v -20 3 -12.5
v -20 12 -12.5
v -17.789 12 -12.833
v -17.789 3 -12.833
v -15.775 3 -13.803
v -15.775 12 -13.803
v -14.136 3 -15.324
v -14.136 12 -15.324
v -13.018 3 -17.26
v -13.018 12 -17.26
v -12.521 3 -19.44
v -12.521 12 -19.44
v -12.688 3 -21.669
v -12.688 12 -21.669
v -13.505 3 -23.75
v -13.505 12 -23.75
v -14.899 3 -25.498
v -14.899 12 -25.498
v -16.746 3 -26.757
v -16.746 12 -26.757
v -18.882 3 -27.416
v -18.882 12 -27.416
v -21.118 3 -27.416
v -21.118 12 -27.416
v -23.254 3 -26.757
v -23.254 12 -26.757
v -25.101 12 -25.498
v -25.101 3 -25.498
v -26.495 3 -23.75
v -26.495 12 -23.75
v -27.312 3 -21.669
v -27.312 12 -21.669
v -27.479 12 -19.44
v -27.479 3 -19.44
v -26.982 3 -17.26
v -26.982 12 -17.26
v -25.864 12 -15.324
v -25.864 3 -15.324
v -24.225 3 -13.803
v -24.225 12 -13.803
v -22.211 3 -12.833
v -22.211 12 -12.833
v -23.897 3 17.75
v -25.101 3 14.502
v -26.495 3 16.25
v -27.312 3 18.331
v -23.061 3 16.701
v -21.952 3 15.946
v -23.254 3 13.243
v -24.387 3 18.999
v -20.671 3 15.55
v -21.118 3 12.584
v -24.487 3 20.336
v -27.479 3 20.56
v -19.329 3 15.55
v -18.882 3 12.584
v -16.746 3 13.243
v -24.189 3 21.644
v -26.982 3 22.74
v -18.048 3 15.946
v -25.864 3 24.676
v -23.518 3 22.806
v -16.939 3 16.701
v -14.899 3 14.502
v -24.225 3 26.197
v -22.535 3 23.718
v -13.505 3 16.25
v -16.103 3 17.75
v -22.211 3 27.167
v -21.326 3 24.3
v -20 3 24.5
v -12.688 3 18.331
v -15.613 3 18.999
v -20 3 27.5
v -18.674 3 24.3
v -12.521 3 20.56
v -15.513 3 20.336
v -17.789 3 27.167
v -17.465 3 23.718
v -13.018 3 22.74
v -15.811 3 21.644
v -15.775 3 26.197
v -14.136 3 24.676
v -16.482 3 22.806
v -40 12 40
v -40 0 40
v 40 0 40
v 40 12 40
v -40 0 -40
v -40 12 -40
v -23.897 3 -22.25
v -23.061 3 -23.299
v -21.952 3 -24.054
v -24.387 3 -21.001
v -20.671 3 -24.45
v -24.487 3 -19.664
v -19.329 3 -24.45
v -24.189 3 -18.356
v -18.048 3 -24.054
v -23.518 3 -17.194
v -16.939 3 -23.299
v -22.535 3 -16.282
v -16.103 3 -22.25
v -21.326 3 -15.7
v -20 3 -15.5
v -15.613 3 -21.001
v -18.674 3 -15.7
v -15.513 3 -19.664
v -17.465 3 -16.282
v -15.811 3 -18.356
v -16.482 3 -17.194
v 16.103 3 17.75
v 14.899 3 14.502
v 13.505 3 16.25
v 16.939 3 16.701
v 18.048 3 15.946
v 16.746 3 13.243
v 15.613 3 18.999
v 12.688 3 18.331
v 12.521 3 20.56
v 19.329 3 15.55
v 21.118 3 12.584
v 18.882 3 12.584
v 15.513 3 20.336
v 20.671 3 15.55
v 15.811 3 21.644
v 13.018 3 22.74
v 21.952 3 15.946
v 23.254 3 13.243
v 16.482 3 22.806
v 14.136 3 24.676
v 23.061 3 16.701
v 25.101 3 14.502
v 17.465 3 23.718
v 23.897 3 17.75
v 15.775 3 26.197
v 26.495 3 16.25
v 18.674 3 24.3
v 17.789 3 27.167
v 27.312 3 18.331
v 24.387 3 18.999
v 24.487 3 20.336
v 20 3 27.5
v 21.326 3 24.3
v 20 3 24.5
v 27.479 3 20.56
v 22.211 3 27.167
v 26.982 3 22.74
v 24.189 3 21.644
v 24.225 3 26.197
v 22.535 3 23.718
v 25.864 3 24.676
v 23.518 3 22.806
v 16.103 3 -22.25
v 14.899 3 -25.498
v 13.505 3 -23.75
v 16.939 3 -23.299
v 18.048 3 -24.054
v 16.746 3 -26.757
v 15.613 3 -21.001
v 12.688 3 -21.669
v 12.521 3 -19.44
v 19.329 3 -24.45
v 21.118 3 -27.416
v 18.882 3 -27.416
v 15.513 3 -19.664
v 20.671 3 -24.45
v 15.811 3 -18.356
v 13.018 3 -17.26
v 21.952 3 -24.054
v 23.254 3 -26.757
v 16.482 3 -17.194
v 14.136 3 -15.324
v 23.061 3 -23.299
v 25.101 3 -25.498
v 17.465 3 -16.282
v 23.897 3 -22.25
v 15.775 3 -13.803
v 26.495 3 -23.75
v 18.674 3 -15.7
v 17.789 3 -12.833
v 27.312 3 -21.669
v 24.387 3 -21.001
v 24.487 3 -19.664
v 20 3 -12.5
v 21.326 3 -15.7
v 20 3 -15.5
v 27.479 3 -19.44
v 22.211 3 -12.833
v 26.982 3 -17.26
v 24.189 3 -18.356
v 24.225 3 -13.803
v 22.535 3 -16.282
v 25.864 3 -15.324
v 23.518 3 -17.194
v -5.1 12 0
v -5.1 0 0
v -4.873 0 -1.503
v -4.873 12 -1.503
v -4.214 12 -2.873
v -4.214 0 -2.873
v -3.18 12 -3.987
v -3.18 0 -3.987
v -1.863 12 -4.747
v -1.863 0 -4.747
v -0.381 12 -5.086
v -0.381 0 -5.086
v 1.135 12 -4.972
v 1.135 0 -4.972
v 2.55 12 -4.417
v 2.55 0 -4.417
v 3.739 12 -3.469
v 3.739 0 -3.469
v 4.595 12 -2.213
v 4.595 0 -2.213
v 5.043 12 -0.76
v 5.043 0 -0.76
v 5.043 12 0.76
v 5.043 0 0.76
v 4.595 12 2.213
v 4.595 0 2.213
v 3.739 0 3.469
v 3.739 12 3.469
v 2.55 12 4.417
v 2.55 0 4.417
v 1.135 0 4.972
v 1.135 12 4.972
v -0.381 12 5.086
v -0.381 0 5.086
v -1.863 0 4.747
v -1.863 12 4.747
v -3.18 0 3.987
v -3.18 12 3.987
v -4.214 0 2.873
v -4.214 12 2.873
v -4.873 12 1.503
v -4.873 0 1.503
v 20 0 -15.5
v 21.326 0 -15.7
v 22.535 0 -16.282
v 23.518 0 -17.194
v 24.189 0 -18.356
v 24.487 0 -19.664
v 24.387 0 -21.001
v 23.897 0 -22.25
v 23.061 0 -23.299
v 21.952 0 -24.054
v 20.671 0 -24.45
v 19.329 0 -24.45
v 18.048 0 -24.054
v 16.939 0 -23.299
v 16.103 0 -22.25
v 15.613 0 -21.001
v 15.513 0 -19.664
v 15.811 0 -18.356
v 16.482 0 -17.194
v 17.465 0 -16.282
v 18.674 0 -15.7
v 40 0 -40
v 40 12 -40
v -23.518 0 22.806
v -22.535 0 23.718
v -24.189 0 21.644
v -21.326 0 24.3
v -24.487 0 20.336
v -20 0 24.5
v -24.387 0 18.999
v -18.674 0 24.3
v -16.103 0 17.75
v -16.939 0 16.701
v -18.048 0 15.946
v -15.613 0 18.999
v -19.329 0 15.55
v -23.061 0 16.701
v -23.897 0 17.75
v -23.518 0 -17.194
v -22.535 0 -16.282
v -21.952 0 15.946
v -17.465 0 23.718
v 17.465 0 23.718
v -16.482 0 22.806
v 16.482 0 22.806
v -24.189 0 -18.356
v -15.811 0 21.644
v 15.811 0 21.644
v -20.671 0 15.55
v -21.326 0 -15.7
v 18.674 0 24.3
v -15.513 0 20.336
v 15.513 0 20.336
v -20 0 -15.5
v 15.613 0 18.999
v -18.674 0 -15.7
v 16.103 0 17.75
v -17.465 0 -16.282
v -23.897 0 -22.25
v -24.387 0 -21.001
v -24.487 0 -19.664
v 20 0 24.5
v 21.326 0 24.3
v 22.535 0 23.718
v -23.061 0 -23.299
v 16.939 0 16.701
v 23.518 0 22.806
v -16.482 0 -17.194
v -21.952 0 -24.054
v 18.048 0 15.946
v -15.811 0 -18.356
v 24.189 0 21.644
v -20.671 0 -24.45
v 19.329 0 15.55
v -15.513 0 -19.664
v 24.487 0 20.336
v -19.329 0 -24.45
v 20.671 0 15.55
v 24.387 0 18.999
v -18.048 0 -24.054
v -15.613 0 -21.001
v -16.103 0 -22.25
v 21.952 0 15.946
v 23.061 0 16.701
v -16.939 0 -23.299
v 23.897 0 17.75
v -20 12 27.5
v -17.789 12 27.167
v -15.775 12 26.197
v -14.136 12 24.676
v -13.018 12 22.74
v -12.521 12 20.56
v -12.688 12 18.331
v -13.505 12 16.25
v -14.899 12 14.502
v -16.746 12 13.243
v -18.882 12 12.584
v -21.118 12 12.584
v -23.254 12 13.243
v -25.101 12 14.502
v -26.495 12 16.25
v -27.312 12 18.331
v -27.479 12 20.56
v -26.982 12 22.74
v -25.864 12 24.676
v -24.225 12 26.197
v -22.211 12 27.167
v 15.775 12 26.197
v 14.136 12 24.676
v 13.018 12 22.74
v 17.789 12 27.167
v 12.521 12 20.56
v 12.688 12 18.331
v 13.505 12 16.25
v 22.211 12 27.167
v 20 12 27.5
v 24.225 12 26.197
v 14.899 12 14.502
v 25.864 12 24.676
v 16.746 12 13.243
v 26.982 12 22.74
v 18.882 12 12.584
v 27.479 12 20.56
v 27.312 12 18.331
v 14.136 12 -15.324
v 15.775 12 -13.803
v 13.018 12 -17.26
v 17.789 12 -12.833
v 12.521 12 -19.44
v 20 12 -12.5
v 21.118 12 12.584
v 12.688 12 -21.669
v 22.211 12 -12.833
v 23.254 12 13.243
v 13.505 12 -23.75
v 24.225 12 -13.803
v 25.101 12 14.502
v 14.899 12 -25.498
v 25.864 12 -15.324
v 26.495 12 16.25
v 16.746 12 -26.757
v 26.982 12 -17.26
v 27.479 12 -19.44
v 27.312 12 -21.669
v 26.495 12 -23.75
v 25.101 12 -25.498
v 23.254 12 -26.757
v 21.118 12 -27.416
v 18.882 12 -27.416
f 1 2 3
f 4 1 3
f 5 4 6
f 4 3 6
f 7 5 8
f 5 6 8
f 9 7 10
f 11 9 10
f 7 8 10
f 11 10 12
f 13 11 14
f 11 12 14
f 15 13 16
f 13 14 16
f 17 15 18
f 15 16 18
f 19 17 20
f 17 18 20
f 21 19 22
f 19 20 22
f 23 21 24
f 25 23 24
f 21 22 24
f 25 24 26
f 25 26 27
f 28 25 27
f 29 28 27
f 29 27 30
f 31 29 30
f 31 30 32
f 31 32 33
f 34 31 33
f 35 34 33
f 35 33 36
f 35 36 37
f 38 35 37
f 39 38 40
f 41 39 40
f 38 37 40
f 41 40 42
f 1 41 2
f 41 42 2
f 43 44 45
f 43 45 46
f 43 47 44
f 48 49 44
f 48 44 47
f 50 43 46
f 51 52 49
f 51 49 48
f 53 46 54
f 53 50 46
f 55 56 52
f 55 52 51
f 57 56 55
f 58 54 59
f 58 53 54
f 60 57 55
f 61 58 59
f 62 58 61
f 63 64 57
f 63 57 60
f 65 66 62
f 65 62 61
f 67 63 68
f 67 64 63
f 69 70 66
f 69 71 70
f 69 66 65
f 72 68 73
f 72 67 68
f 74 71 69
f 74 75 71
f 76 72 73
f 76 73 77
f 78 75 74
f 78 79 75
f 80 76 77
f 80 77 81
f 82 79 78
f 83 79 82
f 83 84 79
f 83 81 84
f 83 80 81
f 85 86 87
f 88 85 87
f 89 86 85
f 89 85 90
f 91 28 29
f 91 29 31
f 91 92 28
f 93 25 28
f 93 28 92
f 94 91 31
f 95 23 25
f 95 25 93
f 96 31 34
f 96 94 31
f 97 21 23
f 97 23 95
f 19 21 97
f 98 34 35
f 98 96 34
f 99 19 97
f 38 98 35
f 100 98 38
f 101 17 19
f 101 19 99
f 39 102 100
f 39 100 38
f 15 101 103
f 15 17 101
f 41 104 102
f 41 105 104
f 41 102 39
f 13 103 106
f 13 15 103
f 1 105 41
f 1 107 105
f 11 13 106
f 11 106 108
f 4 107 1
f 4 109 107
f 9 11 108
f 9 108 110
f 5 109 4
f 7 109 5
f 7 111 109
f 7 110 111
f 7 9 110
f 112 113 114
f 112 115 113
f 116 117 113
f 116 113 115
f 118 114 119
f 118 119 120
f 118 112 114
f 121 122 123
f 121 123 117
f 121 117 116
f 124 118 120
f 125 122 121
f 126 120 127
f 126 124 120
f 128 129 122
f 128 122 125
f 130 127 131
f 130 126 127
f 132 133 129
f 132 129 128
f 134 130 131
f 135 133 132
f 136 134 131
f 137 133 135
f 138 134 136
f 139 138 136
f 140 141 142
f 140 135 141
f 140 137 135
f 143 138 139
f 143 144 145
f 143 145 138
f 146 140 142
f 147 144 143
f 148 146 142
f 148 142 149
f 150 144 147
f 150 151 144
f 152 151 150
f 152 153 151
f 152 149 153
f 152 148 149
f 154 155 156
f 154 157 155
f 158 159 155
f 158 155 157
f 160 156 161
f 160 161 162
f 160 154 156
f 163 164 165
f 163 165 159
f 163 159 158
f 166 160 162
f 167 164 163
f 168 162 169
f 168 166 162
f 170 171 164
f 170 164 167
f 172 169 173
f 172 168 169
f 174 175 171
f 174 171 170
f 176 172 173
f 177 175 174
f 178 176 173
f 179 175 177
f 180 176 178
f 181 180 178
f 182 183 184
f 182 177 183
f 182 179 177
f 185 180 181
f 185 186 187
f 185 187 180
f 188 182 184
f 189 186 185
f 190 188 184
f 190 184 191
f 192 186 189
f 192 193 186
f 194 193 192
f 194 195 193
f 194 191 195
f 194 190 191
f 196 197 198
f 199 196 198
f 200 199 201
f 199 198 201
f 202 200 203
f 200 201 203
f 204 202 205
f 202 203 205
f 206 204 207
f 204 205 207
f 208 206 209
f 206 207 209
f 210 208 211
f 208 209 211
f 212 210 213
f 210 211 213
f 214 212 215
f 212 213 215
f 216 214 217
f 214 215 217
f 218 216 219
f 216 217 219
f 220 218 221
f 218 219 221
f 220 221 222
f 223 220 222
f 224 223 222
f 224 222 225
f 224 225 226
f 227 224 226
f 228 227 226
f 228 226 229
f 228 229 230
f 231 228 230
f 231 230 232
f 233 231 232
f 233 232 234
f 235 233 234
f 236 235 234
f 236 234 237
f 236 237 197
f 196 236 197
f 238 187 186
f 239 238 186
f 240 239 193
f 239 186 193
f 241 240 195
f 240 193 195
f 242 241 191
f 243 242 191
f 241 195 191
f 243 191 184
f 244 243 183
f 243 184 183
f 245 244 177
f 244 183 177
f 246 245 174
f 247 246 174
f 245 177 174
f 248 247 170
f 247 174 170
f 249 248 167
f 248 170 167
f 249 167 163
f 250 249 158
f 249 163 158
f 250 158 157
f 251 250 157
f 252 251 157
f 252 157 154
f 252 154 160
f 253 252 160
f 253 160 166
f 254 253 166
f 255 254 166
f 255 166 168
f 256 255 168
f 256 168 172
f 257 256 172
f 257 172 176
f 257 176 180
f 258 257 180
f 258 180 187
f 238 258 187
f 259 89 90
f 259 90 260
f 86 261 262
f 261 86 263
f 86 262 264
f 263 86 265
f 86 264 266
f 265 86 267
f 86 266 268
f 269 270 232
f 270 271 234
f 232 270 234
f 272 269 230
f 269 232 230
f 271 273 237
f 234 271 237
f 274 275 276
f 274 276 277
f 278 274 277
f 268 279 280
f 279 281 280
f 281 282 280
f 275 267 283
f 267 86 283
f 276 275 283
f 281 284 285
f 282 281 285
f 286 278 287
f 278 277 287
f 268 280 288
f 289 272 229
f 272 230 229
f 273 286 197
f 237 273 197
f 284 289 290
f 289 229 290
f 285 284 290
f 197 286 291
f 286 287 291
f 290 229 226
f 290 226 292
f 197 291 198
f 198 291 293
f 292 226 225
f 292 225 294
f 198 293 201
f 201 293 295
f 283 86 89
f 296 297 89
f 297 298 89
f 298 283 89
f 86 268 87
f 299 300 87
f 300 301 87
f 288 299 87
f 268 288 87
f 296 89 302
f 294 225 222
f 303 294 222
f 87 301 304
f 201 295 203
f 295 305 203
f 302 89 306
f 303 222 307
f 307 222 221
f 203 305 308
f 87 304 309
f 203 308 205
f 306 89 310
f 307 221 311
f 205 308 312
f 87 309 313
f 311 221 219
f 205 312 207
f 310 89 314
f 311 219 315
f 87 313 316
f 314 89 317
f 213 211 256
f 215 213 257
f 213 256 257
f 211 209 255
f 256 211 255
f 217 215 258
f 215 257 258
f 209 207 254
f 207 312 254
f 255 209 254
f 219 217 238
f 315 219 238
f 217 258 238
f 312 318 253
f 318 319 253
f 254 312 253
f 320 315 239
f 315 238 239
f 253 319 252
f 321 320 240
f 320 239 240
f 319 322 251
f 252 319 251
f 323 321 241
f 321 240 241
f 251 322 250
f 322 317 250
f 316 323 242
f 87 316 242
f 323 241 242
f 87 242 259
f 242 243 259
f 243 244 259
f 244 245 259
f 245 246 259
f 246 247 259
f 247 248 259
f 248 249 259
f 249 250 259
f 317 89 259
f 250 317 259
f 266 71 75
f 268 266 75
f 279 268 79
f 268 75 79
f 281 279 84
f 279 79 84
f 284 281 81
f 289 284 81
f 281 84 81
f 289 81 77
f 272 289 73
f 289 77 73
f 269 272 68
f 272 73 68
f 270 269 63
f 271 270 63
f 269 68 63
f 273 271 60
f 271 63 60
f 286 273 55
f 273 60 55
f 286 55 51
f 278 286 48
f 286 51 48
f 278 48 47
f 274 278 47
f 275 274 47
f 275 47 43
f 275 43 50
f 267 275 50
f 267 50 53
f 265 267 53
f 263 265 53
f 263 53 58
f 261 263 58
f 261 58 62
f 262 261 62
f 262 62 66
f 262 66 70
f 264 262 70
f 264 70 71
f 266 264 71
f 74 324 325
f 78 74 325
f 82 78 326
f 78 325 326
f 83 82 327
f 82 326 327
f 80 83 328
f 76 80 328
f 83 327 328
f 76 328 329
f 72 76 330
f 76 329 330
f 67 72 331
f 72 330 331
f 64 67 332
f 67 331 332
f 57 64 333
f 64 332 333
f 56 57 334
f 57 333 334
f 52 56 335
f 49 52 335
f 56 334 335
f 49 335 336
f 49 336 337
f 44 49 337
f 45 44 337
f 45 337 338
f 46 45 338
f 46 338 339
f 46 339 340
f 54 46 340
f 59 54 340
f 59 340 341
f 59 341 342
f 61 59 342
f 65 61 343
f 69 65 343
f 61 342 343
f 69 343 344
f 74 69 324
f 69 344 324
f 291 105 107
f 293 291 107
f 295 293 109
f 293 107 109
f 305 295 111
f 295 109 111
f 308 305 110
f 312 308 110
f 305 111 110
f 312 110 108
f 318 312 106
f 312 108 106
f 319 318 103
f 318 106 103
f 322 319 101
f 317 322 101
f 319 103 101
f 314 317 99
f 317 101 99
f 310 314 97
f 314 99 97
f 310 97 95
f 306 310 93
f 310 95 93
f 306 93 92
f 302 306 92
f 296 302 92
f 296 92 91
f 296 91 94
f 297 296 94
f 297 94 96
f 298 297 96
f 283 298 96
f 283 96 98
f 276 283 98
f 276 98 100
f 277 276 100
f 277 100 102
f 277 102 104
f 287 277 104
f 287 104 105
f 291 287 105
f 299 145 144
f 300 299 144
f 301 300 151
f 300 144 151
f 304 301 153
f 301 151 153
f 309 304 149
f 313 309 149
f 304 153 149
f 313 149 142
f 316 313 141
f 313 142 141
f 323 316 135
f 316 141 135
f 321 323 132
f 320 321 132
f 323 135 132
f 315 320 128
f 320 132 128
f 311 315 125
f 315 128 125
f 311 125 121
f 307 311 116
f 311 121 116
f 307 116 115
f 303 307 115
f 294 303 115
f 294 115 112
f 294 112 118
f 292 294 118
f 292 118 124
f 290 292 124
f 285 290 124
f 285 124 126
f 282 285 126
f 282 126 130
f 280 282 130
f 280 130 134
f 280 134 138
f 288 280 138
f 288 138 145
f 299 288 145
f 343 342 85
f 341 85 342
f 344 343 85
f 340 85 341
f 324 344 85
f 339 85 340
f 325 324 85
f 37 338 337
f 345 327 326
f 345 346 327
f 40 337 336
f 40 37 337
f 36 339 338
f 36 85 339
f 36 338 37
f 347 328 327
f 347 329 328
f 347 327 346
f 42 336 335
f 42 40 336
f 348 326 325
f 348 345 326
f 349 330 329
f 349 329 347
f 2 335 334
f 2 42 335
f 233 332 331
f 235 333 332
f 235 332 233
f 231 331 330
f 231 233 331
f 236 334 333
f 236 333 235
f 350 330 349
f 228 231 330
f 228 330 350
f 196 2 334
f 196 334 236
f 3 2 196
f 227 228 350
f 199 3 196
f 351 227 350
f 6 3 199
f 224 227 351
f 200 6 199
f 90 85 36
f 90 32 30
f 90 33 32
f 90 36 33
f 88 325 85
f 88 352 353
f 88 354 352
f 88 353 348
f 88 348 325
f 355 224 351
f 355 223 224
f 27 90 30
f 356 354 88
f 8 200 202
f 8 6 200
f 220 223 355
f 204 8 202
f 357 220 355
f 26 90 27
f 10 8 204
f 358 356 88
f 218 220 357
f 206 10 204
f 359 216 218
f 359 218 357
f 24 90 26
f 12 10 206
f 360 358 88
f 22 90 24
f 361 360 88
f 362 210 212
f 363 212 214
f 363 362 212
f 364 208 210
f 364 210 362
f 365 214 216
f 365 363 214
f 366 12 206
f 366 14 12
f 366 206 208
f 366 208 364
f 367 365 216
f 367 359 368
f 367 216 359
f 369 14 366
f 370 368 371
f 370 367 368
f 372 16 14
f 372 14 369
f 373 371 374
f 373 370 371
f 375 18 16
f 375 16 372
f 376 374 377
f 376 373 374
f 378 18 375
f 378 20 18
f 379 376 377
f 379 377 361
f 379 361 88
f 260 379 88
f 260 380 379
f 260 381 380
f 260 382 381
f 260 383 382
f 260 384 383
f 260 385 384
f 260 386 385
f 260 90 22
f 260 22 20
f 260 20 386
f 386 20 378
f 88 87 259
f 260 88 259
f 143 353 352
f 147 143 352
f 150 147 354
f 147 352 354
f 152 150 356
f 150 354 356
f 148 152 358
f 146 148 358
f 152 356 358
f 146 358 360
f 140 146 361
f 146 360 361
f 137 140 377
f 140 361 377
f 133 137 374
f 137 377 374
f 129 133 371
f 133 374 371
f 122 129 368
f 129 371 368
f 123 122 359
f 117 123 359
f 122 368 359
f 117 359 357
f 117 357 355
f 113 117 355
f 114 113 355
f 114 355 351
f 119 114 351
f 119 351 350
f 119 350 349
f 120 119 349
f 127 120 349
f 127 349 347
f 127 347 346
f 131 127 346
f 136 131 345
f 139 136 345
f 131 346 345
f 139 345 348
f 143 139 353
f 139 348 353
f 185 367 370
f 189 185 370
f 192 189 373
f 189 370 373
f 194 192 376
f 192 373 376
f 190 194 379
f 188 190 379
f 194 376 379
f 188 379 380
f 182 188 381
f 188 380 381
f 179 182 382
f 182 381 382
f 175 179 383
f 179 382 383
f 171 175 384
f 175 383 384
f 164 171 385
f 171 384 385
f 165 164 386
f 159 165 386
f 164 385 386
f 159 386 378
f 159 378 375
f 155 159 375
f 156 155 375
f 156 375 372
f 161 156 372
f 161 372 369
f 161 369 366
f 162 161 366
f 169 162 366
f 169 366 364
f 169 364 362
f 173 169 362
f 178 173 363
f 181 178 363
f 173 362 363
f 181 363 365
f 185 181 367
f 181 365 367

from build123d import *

# Parameters (mm, degrees)
SKETCH_1_W             = 80
SKETCH_1_H             = 80
EXTRUDE_1_DEPTH        = 12
HOLE_WIZARD_M121_D     = 10.2
HOLE_WIZARD_M121_DEPTH = 12
SKETCH_12_R            = 4.5
CUT_EXTRUDE_1_DEPTH    = 13
SKETCH_13_R            = 7.5
CUT_EXTRUDE_2_DEPTH    = 9


with BuildPart() as part:
    # Эскиз1 → Бобышка-Вытянуть1 (new body)
    with BuildSketch(Plane(origin=(0, 0, 0), x_dir=(1, 0, 0), z_dir=(0, 1, 0))):
        Rectangle(SKETCH_1_W, SKETCH_1_H)
    extrude(amount=EXTRUDE_1_DEPTH)

    # Отверстие обработанное метчиком M121
    with Locations(Plane(origin=(0, 12, 0), x_dir=(1, 0, 0), z_dir=(0, 1, 0))):
        with Locations((0, 0)):
            Hole(HOLE_WIZARD_M121_D / 2, depth=HOLE_WIZARD_M121_DEPTH)

    # Эскиз12 → Вырез-Вытянуть1 (cut, through all)
    with BuildSketch(Plane(origin=(0, 12, 0), x_dir=(1, 0, 0), z_dir=(0, 1, 0))):
        with Locations(Location((-20, 20, 0), (0, 0, 270))):  # turned: the seam where the file's is
            Circle(SKETCH_12_R)
        with Locations(Location((20, 20, 0), (0, 0, 270))):  # turned: the seam where the file's is
            Circle(SKETCH_12_R)
        with Locations(Location((20, -20, 0), (0, 0, 270))):  # turned: the seam where the file's is
            Circle(SKETCH_12_R)
        with Locations(Location((-20, -20, 0), (0, 0, 270))):  # turned: the seam where the file's is
            Circle(SKETCH_12_R)
    extrude(amount=-CUT_EXTRUDE_1_DEPTH, mode=Mode.SUBTRACT)

    # Эскиз13 → Вырез-Вытянуть2 (cut)
    with BuildSketch(Plane(origin=(0, 12, 0), x_dir=(1, 0, 0), z_dir=(0, 1, 0))):
        with Locations(Location((-20, 20, 0), (0, 0, 270))):  # turned: the seam where the file's is
            Circle(SKETCH_13_R)
        with Locations(Location((20, 20, 0), (0, 0, 270))):  # turned: the seam where the file's is
            Circle(SKETCH_13_R)
        with Locations(Location((20, -20, 0), (0, 0, 270))):  # turned: the seam where the file's is
            Circle(SKETCH_13_R)
        with Locations(Location((-20, -20, 0), (0, 0, 270))):  # turned: the seam where the file's is
            Circle(SKETCH_13_R)
    extrude(amount=-CUT_EXTRUDE_2_DEPTH, mode=Mode.SUBTRACT)


solid = part.part
